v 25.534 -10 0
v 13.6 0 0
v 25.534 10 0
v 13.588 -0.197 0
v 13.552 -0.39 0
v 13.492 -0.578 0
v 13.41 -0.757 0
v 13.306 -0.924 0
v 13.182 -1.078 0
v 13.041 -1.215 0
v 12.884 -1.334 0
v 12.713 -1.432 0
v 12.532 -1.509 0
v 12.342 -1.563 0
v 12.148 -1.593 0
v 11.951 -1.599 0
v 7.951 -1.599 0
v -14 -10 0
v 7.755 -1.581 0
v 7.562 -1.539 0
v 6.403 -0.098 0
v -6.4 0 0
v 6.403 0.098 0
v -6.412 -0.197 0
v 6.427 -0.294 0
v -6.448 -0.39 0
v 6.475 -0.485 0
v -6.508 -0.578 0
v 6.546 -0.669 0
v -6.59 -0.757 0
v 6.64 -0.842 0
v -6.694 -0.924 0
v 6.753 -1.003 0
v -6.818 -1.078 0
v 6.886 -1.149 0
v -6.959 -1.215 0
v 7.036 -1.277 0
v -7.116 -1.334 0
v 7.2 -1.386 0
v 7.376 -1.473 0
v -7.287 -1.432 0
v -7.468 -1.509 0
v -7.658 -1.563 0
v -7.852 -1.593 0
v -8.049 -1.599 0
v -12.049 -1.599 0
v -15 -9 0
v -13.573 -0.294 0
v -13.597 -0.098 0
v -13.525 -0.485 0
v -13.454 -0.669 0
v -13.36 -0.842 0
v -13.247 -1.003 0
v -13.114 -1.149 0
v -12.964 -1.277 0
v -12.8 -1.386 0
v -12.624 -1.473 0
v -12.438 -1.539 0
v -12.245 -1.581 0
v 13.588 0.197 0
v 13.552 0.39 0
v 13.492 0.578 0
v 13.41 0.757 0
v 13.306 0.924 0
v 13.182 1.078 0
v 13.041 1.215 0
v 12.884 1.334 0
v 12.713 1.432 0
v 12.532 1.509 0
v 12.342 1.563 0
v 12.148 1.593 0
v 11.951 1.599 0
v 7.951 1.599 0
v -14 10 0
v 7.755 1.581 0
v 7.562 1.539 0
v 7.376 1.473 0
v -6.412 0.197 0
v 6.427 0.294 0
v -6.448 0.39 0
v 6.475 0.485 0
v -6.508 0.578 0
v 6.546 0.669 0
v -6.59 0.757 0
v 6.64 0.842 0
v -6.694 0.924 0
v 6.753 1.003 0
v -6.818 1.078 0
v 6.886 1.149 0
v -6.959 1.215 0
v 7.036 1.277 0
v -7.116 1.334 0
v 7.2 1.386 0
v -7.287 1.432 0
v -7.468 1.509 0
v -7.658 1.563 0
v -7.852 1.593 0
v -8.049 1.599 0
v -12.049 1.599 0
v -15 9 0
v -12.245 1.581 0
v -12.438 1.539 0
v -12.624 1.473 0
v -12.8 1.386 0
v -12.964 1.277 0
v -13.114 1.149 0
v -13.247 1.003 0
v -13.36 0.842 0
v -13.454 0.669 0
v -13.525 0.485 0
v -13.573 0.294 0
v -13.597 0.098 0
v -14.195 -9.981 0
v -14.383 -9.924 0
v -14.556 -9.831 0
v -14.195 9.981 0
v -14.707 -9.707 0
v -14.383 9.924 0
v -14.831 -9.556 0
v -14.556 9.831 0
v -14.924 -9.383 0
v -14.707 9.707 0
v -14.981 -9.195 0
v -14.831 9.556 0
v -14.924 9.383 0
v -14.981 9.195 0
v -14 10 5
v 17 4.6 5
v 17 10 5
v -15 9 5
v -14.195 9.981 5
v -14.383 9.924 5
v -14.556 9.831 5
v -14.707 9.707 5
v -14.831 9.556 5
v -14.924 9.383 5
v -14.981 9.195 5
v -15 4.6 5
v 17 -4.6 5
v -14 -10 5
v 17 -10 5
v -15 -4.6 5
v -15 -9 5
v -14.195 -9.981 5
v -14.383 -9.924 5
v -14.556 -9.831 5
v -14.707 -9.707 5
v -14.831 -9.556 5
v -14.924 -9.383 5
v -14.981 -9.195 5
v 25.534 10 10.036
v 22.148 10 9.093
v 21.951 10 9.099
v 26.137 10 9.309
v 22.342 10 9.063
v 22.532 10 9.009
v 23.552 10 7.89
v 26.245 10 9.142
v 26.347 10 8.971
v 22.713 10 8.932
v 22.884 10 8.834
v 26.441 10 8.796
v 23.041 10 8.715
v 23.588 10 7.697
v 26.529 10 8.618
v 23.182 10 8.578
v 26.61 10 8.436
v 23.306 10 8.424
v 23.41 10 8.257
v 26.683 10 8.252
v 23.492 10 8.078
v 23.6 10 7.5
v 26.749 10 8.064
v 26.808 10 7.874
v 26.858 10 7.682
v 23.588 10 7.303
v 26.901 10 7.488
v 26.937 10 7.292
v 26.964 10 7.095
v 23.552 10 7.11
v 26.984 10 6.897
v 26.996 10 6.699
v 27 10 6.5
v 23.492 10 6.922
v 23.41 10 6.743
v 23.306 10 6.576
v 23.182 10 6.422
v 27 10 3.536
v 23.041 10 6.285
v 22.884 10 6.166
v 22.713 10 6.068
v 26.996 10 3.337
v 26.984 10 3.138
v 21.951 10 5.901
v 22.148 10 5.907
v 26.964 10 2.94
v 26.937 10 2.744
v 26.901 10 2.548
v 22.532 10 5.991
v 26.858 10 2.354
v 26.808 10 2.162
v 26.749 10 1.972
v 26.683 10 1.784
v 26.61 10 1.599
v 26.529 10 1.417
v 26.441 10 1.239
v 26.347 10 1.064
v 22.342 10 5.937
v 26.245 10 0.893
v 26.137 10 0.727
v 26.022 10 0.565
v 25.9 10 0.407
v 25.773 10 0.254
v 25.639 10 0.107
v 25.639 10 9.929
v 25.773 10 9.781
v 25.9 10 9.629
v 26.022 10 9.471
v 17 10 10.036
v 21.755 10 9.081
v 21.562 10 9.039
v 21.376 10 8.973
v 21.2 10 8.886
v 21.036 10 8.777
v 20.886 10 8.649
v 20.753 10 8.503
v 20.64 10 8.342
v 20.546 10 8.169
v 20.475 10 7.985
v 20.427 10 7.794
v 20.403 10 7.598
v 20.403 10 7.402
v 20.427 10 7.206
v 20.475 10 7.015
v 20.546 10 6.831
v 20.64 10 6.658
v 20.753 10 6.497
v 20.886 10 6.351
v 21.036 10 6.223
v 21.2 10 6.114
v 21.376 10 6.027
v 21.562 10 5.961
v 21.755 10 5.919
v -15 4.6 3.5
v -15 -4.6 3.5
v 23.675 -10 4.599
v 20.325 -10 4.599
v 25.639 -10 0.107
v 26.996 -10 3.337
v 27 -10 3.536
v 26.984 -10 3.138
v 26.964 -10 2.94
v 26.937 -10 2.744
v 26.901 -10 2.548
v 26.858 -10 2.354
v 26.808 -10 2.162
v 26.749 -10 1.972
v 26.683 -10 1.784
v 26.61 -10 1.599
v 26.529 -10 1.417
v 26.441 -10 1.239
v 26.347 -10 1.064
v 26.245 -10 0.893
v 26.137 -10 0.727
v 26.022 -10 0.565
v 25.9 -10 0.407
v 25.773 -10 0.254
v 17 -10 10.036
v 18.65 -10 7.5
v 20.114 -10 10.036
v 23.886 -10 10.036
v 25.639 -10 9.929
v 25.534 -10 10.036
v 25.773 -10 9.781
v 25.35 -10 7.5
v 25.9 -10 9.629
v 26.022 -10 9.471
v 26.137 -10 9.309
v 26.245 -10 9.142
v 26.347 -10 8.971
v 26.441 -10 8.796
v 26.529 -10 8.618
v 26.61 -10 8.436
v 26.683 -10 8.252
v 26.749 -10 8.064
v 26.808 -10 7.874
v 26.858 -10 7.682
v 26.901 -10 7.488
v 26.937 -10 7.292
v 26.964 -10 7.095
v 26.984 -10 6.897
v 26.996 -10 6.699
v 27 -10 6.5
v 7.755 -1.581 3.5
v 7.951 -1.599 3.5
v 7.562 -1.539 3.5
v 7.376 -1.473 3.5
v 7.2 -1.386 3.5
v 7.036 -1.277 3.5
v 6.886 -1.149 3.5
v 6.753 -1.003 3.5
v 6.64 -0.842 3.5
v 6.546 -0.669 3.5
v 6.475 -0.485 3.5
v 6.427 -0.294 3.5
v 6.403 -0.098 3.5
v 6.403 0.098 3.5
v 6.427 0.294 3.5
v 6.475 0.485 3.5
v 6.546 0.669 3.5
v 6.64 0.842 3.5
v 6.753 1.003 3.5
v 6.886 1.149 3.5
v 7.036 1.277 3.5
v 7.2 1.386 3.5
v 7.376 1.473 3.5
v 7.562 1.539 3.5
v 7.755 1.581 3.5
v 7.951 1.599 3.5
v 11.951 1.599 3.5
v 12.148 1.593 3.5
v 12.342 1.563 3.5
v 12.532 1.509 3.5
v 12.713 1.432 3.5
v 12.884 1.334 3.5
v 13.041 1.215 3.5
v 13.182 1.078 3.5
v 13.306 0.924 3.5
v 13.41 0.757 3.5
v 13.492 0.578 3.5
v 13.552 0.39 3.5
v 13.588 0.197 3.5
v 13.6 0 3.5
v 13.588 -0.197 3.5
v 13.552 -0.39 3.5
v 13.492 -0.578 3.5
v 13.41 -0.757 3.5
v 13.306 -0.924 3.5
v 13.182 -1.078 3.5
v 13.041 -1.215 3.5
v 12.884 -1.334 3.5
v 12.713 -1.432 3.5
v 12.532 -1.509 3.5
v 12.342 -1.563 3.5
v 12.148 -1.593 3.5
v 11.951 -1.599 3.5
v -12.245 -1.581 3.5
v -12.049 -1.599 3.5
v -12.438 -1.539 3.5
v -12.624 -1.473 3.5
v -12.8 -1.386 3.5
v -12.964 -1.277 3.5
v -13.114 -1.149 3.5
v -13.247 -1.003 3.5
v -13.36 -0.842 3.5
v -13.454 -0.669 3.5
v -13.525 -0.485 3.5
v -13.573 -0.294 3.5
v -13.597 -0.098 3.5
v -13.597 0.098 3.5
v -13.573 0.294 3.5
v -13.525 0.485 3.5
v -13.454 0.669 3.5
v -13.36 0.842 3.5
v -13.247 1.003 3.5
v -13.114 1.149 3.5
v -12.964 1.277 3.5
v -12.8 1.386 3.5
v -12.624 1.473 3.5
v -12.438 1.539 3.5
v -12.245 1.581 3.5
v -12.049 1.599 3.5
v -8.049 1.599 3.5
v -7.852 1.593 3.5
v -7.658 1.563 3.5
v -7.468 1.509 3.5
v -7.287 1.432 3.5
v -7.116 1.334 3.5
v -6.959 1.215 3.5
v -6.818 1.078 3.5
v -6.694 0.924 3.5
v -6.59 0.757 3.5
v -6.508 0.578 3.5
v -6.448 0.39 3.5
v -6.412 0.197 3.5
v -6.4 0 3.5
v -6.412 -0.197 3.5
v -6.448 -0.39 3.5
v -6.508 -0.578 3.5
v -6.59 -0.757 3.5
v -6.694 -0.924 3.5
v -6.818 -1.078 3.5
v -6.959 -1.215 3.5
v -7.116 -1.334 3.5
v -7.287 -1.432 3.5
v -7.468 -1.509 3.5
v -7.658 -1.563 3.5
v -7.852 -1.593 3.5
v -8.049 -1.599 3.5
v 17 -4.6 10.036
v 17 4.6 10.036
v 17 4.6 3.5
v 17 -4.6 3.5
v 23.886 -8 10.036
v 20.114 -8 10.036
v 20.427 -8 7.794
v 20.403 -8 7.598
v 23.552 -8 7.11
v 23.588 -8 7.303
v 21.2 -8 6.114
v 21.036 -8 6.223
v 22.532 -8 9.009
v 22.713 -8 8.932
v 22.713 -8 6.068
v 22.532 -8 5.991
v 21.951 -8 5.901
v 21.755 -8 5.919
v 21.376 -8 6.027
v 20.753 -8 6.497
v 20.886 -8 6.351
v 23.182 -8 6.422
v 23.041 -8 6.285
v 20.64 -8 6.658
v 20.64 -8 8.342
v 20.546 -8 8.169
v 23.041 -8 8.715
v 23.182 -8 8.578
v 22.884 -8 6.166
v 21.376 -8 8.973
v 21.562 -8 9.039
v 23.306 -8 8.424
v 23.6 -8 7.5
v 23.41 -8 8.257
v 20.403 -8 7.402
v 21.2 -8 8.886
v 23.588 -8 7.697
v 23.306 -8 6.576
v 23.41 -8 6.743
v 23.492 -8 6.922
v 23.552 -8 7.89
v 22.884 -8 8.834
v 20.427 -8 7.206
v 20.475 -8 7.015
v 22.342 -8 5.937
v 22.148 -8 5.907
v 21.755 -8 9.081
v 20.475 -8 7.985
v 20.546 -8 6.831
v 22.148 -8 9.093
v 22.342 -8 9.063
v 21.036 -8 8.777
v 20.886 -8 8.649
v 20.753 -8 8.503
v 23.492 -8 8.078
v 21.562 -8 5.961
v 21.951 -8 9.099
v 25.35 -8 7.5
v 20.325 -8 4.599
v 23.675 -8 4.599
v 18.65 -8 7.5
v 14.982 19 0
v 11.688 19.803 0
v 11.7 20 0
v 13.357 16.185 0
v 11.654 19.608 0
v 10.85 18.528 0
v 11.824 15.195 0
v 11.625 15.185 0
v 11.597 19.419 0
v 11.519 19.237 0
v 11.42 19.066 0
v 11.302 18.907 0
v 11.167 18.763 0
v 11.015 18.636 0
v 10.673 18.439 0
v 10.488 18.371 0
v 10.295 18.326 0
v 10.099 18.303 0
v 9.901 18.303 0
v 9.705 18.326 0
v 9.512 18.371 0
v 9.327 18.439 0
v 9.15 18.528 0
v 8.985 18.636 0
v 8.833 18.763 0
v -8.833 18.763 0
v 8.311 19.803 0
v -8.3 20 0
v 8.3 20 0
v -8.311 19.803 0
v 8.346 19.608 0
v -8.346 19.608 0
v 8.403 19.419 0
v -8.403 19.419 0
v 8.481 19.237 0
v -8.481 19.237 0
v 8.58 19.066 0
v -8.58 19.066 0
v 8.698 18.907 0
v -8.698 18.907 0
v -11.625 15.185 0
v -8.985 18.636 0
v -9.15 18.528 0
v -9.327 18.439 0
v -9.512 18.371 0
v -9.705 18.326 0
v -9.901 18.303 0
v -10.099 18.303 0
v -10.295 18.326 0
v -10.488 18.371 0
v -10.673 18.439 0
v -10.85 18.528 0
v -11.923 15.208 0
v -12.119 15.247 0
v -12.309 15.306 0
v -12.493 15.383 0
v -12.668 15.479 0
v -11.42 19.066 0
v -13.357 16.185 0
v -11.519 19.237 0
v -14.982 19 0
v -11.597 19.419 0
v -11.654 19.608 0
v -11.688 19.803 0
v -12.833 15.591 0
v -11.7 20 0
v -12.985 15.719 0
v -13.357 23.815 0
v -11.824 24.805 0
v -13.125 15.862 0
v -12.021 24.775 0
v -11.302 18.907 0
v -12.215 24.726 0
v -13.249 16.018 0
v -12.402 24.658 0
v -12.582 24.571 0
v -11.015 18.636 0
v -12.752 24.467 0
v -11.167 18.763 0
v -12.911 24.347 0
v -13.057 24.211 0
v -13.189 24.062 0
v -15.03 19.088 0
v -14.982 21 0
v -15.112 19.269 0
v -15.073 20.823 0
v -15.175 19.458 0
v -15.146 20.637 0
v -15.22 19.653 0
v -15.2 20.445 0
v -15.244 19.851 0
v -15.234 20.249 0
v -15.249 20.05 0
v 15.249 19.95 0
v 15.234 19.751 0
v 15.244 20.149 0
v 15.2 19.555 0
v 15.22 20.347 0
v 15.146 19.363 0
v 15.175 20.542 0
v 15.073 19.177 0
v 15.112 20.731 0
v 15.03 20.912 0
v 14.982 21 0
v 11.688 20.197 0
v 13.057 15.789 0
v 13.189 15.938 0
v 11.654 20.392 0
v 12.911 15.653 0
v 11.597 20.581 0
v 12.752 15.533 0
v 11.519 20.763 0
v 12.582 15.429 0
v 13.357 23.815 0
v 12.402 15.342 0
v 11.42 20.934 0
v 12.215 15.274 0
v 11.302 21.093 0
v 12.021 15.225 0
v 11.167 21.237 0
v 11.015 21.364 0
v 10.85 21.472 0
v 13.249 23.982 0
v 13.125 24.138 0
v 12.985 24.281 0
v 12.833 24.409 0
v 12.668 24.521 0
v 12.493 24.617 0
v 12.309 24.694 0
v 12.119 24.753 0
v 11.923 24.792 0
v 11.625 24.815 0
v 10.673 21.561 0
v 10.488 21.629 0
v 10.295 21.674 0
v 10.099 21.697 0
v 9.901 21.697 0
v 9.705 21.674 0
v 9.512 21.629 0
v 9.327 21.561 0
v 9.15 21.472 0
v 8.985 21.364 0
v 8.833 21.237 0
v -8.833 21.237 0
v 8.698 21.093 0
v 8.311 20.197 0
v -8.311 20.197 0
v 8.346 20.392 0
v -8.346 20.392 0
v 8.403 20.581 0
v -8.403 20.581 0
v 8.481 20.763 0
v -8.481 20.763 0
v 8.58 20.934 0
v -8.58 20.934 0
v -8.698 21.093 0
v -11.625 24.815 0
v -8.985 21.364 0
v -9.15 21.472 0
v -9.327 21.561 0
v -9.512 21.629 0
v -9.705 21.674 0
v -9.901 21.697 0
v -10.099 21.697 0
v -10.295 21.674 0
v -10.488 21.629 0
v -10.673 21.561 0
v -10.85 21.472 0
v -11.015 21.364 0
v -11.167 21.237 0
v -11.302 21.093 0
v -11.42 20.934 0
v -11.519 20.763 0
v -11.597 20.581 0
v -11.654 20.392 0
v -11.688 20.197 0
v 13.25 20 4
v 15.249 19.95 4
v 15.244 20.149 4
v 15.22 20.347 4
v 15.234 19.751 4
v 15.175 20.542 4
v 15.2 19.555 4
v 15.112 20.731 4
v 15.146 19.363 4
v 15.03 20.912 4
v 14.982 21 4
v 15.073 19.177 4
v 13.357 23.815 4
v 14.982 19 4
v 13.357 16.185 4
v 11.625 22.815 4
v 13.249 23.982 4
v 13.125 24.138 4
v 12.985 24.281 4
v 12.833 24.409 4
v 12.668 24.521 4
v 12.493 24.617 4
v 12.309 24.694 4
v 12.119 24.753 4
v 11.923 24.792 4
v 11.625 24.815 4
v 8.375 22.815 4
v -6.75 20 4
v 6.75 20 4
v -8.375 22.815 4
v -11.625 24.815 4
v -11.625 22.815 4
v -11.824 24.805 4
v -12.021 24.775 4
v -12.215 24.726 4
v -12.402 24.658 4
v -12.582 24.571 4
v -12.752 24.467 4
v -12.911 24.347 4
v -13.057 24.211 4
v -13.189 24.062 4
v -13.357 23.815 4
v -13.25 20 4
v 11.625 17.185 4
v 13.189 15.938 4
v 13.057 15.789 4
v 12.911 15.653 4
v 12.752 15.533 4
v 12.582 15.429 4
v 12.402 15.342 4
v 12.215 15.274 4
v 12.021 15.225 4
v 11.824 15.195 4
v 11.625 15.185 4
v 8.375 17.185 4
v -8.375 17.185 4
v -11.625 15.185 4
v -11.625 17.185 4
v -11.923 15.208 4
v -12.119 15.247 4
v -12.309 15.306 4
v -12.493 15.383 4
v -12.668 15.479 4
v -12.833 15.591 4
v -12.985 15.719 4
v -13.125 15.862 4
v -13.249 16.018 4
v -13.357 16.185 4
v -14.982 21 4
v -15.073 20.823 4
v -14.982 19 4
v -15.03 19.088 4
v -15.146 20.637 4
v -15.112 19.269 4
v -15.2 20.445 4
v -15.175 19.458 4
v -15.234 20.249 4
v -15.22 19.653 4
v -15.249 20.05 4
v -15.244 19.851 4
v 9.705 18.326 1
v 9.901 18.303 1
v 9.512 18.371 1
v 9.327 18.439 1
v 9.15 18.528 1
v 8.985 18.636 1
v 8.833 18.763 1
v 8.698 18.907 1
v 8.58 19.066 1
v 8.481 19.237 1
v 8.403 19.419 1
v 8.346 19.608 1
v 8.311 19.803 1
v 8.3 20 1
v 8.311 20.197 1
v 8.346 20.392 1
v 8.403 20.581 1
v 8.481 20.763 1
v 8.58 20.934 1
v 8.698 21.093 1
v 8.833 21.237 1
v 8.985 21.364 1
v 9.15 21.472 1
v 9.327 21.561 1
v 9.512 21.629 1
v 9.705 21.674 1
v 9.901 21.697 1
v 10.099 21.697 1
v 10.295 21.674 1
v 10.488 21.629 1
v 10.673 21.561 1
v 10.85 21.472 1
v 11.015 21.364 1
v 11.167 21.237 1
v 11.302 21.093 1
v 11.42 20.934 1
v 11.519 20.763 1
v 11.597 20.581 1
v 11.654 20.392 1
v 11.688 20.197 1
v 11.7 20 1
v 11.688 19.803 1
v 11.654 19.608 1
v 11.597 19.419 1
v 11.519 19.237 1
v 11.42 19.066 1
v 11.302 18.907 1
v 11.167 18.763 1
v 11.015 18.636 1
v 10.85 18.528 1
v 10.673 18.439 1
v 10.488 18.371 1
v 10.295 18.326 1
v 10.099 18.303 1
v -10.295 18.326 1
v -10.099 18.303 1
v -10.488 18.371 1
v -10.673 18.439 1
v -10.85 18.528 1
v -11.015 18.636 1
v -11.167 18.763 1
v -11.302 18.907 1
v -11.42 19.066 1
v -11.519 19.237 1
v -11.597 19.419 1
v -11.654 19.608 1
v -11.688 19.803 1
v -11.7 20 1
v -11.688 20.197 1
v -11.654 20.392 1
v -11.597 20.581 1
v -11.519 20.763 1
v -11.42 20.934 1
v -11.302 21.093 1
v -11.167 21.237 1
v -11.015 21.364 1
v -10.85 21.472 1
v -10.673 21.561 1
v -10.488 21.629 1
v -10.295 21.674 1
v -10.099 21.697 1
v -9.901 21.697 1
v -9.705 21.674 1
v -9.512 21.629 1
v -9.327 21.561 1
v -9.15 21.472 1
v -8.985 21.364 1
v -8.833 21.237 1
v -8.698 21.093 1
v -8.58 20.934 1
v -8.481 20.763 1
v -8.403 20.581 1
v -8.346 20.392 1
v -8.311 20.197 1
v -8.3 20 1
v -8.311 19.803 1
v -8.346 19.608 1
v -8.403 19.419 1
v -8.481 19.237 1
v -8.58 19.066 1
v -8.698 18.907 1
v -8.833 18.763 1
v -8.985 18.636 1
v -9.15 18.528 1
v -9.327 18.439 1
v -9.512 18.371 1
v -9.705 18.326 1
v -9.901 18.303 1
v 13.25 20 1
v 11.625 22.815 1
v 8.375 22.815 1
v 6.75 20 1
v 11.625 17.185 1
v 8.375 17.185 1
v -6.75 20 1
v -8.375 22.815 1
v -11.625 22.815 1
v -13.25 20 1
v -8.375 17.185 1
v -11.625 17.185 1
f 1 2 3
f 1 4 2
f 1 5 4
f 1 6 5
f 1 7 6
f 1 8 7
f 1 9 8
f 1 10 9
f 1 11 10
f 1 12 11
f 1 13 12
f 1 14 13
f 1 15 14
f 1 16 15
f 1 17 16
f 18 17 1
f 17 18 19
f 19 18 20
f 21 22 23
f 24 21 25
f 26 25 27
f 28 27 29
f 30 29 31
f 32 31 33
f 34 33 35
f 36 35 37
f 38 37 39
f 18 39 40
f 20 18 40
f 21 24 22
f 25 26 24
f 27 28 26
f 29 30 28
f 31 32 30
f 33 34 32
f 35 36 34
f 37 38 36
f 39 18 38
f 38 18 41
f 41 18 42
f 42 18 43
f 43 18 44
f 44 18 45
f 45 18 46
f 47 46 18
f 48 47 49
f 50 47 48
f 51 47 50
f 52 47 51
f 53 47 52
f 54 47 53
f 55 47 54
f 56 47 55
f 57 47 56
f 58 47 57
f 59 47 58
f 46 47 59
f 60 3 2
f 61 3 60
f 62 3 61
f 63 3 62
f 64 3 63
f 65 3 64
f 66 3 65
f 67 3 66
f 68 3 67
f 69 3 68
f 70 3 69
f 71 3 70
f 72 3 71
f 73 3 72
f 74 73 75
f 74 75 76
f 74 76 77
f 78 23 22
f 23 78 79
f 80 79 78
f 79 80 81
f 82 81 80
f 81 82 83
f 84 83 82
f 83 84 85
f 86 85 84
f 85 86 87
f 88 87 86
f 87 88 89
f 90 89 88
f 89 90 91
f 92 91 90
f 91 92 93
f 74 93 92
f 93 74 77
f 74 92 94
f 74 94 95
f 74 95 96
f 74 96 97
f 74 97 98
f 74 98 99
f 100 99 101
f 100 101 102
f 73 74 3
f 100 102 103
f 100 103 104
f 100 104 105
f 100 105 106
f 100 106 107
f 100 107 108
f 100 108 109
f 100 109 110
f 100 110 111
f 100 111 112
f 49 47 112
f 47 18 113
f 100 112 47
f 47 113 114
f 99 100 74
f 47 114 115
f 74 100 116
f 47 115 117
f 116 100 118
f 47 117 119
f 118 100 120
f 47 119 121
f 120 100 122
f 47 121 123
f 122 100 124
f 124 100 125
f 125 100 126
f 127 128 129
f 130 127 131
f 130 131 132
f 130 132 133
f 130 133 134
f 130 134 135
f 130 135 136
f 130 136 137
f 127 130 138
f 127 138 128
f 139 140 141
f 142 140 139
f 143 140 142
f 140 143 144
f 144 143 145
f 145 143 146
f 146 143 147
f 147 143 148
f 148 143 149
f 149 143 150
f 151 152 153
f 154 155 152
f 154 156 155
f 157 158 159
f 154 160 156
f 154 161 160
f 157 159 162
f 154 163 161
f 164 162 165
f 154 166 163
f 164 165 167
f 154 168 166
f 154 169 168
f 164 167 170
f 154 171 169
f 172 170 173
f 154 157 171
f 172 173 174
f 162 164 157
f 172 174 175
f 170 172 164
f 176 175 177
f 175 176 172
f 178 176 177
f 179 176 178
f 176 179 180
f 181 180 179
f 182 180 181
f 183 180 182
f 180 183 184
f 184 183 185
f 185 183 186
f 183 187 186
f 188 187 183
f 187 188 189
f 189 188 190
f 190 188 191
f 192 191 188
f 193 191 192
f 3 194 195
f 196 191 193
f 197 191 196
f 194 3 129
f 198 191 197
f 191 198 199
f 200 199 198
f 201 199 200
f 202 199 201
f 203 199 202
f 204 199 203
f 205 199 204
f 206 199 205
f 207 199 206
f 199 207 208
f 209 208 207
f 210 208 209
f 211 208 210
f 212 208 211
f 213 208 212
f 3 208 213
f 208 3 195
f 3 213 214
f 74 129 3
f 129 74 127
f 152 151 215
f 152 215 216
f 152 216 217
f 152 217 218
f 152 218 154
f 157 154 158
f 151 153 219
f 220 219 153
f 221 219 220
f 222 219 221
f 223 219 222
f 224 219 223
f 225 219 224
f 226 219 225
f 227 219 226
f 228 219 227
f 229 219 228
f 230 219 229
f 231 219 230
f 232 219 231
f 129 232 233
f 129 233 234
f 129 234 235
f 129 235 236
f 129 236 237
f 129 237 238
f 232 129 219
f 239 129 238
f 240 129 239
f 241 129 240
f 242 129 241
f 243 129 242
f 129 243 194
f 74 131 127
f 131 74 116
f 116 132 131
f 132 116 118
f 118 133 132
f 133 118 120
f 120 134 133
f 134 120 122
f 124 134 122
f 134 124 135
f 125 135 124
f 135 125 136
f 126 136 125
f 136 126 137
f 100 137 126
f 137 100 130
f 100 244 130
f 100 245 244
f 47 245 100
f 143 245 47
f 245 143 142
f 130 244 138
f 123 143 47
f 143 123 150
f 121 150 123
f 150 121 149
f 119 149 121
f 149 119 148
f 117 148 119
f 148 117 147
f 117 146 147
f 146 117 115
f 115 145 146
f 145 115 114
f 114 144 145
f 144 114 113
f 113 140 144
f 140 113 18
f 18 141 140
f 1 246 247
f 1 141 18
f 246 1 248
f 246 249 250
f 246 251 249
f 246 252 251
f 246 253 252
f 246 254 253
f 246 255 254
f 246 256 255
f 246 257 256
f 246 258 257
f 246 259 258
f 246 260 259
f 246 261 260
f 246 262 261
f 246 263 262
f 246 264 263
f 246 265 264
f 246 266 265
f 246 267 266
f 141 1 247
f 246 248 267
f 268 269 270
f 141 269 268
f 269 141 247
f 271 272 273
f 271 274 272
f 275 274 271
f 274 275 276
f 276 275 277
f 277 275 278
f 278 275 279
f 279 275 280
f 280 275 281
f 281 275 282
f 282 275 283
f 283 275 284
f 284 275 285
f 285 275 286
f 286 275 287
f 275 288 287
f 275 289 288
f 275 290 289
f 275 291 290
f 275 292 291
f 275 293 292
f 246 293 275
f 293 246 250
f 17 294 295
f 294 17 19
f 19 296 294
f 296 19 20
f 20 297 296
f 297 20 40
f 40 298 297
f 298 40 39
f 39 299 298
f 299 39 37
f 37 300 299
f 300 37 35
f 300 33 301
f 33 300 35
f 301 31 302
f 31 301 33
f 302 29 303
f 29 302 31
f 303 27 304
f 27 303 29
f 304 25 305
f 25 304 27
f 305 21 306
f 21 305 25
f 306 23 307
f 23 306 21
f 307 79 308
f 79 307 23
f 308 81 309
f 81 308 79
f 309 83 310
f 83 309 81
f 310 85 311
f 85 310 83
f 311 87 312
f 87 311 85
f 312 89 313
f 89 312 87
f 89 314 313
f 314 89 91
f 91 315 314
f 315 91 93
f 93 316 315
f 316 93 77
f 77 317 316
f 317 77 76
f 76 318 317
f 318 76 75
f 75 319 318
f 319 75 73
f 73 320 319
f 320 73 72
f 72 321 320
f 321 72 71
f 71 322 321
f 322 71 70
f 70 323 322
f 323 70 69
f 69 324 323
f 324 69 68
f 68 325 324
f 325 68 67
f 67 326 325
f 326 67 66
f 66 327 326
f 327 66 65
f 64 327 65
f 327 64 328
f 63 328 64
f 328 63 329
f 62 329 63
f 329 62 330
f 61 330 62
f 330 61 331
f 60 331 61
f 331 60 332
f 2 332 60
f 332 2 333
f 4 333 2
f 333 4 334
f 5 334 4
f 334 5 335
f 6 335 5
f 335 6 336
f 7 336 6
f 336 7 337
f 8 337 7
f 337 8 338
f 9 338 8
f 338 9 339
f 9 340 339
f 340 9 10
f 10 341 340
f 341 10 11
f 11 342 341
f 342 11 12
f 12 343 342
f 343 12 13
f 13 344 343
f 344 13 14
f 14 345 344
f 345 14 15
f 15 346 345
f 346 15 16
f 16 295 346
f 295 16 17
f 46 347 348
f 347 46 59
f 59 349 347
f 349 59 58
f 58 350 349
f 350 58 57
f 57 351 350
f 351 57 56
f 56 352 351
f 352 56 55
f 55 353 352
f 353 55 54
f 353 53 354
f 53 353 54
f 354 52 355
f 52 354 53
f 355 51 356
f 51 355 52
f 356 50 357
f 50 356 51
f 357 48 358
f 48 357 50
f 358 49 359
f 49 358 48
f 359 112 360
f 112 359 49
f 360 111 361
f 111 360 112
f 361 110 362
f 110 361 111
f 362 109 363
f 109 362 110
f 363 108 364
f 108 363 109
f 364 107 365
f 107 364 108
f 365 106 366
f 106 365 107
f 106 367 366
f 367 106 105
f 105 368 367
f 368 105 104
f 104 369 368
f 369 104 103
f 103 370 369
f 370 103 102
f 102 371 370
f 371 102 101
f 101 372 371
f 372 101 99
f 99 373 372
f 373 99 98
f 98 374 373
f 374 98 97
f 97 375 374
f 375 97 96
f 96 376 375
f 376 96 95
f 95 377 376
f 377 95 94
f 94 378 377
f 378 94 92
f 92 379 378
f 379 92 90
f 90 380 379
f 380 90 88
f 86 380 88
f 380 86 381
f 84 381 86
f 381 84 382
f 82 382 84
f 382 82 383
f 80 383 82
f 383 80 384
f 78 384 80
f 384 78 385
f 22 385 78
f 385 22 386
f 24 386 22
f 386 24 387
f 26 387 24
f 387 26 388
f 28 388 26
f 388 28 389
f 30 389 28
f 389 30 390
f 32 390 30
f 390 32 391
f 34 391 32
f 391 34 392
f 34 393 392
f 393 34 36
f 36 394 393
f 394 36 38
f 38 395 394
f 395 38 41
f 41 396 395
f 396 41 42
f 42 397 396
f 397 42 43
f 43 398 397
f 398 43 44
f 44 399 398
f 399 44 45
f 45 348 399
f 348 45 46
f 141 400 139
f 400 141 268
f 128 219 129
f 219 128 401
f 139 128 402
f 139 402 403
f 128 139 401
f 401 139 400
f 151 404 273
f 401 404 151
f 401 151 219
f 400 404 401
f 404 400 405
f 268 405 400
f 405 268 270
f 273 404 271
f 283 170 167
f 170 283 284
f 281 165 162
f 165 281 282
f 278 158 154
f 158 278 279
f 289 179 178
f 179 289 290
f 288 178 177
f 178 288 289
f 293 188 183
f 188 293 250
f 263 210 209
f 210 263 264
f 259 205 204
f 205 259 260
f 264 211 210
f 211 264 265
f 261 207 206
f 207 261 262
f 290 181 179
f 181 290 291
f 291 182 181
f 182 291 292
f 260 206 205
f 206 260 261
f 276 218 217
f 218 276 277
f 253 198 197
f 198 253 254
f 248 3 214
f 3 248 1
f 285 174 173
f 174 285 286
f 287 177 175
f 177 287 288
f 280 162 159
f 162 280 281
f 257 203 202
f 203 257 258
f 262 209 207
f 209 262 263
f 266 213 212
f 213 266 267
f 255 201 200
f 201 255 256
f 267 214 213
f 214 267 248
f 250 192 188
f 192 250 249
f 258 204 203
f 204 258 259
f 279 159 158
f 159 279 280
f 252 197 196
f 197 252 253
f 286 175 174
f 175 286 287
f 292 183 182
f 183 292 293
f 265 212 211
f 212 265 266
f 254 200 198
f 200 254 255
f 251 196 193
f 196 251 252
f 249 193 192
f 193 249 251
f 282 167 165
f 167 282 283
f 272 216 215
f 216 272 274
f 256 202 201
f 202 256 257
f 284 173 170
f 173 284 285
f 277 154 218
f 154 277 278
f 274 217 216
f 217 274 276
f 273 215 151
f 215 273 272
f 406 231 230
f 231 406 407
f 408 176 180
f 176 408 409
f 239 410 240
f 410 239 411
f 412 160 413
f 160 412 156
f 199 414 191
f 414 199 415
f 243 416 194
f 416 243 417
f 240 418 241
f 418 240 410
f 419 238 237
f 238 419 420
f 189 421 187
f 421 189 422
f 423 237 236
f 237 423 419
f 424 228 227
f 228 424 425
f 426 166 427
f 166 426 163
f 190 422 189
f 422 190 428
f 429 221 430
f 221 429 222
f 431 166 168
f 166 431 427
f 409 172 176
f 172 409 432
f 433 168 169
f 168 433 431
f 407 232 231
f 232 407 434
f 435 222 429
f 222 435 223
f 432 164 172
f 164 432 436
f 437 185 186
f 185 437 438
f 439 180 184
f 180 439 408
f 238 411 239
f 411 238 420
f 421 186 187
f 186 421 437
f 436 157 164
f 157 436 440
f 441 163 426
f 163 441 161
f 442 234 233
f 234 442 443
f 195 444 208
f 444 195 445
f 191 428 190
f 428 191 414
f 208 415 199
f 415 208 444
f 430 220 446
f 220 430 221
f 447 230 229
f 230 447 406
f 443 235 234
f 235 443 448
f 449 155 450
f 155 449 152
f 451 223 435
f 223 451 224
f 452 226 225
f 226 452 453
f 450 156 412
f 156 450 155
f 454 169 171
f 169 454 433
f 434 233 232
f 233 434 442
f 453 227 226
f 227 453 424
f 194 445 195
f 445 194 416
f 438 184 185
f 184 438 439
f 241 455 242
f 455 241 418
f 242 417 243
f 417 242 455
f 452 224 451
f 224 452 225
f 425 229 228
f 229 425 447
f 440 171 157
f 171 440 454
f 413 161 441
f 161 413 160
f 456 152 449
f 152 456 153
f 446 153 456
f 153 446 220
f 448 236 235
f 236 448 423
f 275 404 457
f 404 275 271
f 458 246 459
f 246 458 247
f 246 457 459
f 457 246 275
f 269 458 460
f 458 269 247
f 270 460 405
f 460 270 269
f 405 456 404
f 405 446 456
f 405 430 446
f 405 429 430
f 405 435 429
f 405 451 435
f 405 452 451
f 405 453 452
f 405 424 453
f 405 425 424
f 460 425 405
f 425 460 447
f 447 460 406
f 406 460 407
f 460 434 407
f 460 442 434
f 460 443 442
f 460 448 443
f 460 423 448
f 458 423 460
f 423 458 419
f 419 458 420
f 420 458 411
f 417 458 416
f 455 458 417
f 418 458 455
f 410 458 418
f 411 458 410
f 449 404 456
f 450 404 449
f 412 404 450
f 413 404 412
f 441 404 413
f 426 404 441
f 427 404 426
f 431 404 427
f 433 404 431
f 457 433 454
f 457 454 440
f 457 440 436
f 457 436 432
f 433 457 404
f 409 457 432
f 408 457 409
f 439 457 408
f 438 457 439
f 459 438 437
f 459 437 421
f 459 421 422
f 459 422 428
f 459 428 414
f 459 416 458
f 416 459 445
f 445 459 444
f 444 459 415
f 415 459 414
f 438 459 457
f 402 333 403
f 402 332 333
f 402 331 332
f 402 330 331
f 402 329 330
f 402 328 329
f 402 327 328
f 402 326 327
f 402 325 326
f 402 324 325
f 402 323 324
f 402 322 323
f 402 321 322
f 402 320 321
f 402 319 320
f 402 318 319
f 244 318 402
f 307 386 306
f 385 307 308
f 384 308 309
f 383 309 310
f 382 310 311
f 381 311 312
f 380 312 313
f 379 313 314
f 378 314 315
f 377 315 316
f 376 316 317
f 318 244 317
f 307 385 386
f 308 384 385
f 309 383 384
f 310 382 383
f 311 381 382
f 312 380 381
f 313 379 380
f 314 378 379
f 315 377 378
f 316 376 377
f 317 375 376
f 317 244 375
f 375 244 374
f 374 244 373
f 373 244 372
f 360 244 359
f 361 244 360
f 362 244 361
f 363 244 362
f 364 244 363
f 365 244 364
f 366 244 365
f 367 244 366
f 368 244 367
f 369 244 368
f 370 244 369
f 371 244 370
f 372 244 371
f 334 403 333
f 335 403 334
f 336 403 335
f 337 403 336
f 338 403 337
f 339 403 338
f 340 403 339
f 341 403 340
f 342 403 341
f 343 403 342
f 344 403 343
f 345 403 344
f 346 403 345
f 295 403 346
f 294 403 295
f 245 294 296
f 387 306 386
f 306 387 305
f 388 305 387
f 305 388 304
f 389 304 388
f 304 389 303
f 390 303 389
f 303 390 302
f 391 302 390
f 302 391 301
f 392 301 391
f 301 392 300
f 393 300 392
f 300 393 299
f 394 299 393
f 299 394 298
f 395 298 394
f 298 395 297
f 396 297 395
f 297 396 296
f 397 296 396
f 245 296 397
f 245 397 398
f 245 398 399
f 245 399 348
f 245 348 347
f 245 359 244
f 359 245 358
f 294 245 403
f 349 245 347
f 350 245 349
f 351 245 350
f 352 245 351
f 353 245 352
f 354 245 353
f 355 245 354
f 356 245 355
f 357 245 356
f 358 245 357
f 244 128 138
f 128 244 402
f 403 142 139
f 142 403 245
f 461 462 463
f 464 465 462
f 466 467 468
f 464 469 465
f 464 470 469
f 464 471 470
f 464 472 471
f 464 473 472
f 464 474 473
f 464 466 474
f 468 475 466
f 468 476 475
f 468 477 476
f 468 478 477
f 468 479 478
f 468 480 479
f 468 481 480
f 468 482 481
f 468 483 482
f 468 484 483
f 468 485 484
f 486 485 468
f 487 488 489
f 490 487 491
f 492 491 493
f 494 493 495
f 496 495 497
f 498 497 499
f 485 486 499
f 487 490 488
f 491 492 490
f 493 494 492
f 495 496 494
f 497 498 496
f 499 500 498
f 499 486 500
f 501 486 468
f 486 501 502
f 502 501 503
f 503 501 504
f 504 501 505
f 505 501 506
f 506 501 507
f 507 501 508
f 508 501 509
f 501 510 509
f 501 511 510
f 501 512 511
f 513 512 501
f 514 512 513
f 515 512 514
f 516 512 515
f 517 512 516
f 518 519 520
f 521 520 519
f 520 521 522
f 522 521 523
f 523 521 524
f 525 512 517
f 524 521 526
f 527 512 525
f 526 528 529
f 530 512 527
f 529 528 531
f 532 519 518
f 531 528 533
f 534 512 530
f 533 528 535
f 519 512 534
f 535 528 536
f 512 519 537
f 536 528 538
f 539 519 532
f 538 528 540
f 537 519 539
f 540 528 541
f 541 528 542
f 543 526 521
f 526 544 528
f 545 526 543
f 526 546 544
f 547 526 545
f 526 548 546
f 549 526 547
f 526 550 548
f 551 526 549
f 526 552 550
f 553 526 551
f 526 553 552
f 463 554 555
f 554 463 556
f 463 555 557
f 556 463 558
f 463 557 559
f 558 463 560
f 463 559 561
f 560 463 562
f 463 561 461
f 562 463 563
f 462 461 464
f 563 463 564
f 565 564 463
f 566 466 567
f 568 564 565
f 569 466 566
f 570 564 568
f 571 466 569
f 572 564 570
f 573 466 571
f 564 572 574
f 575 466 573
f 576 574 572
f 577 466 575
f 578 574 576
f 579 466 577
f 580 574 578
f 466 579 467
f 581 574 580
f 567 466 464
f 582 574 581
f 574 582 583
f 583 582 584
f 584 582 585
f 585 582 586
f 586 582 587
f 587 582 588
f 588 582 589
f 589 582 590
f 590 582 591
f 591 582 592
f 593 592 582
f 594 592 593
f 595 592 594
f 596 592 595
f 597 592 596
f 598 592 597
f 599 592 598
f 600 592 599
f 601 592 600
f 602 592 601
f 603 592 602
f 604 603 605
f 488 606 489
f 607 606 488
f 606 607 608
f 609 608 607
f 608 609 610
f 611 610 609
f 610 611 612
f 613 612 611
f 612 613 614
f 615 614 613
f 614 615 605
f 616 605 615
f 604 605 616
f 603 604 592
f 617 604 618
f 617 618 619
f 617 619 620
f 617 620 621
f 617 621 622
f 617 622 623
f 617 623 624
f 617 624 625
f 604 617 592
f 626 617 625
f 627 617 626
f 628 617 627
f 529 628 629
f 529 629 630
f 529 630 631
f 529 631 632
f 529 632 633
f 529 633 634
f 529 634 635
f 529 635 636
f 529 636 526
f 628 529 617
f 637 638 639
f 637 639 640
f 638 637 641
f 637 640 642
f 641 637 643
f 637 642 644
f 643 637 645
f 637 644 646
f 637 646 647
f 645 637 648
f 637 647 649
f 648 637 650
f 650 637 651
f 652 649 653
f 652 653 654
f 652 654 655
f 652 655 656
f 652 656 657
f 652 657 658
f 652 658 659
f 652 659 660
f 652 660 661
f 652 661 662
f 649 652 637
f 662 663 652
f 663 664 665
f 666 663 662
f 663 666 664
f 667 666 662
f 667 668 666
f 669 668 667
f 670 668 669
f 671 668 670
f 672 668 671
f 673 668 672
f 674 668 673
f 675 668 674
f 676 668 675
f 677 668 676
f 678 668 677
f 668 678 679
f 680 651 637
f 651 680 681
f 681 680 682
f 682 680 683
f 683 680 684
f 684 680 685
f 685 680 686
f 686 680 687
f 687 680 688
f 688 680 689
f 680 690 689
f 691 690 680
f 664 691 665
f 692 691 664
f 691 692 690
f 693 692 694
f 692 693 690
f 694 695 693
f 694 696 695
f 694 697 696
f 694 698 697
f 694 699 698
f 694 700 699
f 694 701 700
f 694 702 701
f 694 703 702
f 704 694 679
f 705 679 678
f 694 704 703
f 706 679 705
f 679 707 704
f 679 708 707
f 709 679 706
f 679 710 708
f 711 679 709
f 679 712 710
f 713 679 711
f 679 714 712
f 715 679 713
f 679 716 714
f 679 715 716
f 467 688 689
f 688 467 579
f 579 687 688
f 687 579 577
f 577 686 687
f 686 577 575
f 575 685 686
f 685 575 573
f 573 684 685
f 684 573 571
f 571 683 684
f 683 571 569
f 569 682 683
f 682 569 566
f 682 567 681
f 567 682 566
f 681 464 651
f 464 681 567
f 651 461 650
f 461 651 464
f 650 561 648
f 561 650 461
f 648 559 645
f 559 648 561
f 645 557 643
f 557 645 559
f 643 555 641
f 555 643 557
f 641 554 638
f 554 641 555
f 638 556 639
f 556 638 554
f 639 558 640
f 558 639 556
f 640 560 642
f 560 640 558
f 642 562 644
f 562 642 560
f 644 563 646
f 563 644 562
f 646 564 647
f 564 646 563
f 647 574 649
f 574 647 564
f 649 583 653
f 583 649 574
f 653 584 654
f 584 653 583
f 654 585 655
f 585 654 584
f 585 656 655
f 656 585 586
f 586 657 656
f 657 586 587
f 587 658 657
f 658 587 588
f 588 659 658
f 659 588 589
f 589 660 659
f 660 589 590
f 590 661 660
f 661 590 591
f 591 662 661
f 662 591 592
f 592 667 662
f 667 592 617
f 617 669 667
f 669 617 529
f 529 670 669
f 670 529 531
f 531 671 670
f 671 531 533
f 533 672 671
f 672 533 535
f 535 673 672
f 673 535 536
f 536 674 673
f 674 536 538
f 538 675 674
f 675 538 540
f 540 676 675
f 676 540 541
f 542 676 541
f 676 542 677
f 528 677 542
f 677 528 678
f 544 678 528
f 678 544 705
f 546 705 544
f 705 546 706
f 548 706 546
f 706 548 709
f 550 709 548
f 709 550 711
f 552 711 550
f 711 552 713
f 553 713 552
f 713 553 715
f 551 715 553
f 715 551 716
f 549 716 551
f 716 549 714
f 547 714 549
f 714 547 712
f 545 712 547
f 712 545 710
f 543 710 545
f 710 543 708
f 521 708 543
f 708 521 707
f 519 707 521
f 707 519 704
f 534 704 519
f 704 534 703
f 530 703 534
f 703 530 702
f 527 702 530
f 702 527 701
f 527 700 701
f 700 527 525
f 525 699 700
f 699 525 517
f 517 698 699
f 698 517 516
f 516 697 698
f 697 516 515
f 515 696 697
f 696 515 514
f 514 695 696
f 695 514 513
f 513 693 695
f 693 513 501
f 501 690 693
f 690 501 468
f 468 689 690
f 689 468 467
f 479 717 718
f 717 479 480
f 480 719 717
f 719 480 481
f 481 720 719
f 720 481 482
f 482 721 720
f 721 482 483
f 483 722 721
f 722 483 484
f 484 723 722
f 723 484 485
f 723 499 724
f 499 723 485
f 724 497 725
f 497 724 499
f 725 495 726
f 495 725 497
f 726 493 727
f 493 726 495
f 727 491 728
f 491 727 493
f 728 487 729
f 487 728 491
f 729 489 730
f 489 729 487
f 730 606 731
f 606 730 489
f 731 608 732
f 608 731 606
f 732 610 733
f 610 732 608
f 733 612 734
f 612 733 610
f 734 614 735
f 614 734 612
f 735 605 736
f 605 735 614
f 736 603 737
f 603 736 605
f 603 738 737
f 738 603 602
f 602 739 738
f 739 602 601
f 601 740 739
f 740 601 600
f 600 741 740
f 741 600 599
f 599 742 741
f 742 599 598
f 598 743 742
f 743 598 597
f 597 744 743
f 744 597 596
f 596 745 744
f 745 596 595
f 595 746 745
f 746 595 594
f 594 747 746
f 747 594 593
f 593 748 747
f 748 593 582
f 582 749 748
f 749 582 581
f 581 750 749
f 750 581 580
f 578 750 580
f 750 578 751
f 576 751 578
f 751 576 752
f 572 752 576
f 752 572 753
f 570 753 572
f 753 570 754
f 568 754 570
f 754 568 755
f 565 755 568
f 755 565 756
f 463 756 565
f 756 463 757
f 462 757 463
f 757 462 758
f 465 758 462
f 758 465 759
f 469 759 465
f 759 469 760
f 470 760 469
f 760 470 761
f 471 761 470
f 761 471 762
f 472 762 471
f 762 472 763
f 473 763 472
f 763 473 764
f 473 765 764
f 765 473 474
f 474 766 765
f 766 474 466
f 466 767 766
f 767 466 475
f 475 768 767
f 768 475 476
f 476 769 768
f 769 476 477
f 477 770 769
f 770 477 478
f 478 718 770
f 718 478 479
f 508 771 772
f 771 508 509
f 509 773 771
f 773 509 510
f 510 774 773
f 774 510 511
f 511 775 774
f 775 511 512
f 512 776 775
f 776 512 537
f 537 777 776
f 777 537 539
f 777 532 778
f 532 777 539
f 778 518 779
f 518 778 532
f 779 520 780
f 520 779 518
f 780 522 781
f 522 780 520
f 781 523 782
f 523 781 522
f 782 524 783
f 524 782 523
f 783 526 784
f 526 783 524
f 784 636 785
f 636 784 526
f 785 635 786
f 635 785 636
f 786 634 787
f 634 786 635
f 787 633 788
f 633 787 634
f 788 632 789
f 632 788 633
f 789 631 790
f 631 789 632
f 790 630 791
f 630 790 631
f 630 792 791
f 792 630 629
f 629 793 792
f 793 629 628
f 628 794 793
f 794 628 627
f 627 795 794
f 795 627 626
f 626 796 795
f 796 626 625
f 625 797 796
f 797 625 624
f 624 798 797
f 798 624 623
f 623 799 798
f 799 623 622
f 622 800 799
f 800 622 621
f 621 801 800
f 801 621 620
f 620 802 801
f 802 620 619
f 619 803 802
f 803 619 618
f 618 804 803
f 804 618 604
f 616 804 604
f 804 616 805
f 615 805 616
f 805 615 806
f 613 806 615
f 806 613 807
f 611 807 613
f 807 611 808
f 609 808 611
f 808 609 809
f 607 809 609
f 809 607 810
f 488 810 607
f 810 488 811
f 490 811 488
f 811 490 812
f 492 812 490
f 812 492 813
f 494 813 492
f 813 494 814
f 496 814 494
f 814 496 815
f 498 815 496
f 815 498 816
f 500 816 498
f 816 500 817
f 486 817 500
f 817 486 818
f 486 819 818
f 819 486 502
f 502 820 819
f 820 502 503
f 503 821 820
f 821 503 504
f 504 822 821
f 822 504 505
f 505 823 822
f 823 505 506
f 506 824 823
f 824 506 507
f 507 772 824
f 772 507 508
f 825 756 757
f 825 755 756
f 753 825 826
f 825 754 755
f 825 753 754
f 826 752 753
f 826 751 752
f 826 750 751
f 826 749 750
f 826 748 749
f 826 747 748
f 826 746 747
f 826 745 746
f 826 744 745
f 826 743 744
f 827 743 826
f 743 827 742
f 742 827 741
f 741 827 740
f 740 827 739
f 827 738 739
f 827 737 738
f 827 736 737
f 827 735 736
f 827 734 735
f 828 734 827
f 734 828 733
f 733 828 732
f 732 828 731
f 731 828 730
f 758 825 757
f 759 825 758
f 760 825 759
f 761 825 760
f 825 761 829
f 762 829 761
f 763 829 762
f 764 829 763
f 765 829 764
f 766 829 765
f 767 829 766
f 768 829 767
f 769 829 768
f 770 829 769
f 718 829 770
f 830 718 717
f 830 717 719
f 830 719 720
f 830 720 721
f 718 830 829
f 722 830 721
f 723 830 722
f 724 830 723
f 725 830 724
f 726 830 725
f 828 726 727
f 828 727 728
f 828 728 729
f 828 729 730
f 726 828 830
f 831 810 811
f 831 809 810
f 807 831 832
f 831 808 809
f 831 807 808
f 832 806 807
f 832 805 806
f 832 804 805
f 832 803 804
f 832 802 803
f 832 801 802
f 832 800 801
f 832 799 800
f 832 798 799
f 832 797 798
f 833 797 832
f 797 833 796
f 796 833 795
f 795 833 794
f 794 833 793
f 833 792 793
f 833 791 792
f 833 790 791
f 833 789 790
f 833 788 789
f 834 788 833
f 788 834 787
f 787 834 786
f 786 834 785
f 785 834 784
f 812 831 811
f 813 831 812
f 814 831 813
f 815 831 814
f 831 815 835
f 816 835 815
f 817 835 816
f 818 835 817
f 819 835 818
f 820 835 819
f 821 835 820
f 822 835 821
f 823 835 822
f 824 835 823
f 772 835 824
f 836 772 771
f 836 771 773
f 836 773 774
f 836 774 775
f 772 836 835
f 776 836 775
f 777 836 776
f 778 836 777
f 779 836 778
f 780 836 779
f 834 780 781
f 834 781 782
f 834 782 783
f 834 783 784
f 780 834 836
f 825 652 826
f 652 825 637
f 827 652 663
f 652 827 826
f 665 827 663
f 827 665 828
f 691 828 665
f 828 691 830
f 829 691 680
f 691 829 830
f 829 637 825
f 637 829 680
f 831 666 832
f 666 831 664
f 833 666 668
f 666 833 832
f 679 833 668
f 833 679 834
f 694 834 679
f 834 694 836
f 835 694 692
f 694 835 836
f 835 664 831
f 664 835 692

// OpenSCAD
h = 13.5;

$fs = .2;
$fa = 2;

difference() {
	union() {
		linear_extrude(5, convexity = 5) difference() {
			offset(1) offset(-1) hull() {
				square([30, 20], center = true);
				translate([22 - 5, 0, 0]) square([10, 20], center = true);
			}
			for(i = [1, -1]) translate([i * 10, 0, 0]) hull() for(j = [1, -1]) translate([j * 2, 0, 0]) circle(3/2 + .1);
		}
		translate([22, 0, 0]) rotate([-90, 0, 0]) linear_extrude(20, convexity = 5, center = true) hull() for(i = [5 * sin(45), 6.5]) translate([0, -i, 0]) intersection() {
			union() {
				circle(5);
				rotate(180) square(5);
			}
			square([10, 10 / sqrt(2)], center = true);
		}
	}
	translate([22, 0, 7.5]) rotate([-90, 0, 0]) {
		cylinder(r = 3/2 + .1, h = 100, center = true);
		translate([0, 0, -10]) cylinder(r = 3.25 + .1, h = 4, center = true, $fn = 6);
	}
	//translate([28, 0, 22]) cube(40, center = true);
	translate([0, 0, 5 + 3.5]) cube([34, 9.2, 10], center = true);
}

translate([0, 20, 0]) difference() {
	linear_extrude(4) difference() {
		offset(2) hull() for(i = [1, -1]) translate([i * 10, 0, 0]) circle(6.5/2, $fn = 6);
		for(i = [1, -1]) translate([i * 10, 0, 0]) circle(3/2 + .2);
	}
	translate([0, 0, 1]) linear_extrude(4) for(i = [1, -1]) translate([i * 10, 0, 0]) circle(6.5/2, $fn = 6);
}
